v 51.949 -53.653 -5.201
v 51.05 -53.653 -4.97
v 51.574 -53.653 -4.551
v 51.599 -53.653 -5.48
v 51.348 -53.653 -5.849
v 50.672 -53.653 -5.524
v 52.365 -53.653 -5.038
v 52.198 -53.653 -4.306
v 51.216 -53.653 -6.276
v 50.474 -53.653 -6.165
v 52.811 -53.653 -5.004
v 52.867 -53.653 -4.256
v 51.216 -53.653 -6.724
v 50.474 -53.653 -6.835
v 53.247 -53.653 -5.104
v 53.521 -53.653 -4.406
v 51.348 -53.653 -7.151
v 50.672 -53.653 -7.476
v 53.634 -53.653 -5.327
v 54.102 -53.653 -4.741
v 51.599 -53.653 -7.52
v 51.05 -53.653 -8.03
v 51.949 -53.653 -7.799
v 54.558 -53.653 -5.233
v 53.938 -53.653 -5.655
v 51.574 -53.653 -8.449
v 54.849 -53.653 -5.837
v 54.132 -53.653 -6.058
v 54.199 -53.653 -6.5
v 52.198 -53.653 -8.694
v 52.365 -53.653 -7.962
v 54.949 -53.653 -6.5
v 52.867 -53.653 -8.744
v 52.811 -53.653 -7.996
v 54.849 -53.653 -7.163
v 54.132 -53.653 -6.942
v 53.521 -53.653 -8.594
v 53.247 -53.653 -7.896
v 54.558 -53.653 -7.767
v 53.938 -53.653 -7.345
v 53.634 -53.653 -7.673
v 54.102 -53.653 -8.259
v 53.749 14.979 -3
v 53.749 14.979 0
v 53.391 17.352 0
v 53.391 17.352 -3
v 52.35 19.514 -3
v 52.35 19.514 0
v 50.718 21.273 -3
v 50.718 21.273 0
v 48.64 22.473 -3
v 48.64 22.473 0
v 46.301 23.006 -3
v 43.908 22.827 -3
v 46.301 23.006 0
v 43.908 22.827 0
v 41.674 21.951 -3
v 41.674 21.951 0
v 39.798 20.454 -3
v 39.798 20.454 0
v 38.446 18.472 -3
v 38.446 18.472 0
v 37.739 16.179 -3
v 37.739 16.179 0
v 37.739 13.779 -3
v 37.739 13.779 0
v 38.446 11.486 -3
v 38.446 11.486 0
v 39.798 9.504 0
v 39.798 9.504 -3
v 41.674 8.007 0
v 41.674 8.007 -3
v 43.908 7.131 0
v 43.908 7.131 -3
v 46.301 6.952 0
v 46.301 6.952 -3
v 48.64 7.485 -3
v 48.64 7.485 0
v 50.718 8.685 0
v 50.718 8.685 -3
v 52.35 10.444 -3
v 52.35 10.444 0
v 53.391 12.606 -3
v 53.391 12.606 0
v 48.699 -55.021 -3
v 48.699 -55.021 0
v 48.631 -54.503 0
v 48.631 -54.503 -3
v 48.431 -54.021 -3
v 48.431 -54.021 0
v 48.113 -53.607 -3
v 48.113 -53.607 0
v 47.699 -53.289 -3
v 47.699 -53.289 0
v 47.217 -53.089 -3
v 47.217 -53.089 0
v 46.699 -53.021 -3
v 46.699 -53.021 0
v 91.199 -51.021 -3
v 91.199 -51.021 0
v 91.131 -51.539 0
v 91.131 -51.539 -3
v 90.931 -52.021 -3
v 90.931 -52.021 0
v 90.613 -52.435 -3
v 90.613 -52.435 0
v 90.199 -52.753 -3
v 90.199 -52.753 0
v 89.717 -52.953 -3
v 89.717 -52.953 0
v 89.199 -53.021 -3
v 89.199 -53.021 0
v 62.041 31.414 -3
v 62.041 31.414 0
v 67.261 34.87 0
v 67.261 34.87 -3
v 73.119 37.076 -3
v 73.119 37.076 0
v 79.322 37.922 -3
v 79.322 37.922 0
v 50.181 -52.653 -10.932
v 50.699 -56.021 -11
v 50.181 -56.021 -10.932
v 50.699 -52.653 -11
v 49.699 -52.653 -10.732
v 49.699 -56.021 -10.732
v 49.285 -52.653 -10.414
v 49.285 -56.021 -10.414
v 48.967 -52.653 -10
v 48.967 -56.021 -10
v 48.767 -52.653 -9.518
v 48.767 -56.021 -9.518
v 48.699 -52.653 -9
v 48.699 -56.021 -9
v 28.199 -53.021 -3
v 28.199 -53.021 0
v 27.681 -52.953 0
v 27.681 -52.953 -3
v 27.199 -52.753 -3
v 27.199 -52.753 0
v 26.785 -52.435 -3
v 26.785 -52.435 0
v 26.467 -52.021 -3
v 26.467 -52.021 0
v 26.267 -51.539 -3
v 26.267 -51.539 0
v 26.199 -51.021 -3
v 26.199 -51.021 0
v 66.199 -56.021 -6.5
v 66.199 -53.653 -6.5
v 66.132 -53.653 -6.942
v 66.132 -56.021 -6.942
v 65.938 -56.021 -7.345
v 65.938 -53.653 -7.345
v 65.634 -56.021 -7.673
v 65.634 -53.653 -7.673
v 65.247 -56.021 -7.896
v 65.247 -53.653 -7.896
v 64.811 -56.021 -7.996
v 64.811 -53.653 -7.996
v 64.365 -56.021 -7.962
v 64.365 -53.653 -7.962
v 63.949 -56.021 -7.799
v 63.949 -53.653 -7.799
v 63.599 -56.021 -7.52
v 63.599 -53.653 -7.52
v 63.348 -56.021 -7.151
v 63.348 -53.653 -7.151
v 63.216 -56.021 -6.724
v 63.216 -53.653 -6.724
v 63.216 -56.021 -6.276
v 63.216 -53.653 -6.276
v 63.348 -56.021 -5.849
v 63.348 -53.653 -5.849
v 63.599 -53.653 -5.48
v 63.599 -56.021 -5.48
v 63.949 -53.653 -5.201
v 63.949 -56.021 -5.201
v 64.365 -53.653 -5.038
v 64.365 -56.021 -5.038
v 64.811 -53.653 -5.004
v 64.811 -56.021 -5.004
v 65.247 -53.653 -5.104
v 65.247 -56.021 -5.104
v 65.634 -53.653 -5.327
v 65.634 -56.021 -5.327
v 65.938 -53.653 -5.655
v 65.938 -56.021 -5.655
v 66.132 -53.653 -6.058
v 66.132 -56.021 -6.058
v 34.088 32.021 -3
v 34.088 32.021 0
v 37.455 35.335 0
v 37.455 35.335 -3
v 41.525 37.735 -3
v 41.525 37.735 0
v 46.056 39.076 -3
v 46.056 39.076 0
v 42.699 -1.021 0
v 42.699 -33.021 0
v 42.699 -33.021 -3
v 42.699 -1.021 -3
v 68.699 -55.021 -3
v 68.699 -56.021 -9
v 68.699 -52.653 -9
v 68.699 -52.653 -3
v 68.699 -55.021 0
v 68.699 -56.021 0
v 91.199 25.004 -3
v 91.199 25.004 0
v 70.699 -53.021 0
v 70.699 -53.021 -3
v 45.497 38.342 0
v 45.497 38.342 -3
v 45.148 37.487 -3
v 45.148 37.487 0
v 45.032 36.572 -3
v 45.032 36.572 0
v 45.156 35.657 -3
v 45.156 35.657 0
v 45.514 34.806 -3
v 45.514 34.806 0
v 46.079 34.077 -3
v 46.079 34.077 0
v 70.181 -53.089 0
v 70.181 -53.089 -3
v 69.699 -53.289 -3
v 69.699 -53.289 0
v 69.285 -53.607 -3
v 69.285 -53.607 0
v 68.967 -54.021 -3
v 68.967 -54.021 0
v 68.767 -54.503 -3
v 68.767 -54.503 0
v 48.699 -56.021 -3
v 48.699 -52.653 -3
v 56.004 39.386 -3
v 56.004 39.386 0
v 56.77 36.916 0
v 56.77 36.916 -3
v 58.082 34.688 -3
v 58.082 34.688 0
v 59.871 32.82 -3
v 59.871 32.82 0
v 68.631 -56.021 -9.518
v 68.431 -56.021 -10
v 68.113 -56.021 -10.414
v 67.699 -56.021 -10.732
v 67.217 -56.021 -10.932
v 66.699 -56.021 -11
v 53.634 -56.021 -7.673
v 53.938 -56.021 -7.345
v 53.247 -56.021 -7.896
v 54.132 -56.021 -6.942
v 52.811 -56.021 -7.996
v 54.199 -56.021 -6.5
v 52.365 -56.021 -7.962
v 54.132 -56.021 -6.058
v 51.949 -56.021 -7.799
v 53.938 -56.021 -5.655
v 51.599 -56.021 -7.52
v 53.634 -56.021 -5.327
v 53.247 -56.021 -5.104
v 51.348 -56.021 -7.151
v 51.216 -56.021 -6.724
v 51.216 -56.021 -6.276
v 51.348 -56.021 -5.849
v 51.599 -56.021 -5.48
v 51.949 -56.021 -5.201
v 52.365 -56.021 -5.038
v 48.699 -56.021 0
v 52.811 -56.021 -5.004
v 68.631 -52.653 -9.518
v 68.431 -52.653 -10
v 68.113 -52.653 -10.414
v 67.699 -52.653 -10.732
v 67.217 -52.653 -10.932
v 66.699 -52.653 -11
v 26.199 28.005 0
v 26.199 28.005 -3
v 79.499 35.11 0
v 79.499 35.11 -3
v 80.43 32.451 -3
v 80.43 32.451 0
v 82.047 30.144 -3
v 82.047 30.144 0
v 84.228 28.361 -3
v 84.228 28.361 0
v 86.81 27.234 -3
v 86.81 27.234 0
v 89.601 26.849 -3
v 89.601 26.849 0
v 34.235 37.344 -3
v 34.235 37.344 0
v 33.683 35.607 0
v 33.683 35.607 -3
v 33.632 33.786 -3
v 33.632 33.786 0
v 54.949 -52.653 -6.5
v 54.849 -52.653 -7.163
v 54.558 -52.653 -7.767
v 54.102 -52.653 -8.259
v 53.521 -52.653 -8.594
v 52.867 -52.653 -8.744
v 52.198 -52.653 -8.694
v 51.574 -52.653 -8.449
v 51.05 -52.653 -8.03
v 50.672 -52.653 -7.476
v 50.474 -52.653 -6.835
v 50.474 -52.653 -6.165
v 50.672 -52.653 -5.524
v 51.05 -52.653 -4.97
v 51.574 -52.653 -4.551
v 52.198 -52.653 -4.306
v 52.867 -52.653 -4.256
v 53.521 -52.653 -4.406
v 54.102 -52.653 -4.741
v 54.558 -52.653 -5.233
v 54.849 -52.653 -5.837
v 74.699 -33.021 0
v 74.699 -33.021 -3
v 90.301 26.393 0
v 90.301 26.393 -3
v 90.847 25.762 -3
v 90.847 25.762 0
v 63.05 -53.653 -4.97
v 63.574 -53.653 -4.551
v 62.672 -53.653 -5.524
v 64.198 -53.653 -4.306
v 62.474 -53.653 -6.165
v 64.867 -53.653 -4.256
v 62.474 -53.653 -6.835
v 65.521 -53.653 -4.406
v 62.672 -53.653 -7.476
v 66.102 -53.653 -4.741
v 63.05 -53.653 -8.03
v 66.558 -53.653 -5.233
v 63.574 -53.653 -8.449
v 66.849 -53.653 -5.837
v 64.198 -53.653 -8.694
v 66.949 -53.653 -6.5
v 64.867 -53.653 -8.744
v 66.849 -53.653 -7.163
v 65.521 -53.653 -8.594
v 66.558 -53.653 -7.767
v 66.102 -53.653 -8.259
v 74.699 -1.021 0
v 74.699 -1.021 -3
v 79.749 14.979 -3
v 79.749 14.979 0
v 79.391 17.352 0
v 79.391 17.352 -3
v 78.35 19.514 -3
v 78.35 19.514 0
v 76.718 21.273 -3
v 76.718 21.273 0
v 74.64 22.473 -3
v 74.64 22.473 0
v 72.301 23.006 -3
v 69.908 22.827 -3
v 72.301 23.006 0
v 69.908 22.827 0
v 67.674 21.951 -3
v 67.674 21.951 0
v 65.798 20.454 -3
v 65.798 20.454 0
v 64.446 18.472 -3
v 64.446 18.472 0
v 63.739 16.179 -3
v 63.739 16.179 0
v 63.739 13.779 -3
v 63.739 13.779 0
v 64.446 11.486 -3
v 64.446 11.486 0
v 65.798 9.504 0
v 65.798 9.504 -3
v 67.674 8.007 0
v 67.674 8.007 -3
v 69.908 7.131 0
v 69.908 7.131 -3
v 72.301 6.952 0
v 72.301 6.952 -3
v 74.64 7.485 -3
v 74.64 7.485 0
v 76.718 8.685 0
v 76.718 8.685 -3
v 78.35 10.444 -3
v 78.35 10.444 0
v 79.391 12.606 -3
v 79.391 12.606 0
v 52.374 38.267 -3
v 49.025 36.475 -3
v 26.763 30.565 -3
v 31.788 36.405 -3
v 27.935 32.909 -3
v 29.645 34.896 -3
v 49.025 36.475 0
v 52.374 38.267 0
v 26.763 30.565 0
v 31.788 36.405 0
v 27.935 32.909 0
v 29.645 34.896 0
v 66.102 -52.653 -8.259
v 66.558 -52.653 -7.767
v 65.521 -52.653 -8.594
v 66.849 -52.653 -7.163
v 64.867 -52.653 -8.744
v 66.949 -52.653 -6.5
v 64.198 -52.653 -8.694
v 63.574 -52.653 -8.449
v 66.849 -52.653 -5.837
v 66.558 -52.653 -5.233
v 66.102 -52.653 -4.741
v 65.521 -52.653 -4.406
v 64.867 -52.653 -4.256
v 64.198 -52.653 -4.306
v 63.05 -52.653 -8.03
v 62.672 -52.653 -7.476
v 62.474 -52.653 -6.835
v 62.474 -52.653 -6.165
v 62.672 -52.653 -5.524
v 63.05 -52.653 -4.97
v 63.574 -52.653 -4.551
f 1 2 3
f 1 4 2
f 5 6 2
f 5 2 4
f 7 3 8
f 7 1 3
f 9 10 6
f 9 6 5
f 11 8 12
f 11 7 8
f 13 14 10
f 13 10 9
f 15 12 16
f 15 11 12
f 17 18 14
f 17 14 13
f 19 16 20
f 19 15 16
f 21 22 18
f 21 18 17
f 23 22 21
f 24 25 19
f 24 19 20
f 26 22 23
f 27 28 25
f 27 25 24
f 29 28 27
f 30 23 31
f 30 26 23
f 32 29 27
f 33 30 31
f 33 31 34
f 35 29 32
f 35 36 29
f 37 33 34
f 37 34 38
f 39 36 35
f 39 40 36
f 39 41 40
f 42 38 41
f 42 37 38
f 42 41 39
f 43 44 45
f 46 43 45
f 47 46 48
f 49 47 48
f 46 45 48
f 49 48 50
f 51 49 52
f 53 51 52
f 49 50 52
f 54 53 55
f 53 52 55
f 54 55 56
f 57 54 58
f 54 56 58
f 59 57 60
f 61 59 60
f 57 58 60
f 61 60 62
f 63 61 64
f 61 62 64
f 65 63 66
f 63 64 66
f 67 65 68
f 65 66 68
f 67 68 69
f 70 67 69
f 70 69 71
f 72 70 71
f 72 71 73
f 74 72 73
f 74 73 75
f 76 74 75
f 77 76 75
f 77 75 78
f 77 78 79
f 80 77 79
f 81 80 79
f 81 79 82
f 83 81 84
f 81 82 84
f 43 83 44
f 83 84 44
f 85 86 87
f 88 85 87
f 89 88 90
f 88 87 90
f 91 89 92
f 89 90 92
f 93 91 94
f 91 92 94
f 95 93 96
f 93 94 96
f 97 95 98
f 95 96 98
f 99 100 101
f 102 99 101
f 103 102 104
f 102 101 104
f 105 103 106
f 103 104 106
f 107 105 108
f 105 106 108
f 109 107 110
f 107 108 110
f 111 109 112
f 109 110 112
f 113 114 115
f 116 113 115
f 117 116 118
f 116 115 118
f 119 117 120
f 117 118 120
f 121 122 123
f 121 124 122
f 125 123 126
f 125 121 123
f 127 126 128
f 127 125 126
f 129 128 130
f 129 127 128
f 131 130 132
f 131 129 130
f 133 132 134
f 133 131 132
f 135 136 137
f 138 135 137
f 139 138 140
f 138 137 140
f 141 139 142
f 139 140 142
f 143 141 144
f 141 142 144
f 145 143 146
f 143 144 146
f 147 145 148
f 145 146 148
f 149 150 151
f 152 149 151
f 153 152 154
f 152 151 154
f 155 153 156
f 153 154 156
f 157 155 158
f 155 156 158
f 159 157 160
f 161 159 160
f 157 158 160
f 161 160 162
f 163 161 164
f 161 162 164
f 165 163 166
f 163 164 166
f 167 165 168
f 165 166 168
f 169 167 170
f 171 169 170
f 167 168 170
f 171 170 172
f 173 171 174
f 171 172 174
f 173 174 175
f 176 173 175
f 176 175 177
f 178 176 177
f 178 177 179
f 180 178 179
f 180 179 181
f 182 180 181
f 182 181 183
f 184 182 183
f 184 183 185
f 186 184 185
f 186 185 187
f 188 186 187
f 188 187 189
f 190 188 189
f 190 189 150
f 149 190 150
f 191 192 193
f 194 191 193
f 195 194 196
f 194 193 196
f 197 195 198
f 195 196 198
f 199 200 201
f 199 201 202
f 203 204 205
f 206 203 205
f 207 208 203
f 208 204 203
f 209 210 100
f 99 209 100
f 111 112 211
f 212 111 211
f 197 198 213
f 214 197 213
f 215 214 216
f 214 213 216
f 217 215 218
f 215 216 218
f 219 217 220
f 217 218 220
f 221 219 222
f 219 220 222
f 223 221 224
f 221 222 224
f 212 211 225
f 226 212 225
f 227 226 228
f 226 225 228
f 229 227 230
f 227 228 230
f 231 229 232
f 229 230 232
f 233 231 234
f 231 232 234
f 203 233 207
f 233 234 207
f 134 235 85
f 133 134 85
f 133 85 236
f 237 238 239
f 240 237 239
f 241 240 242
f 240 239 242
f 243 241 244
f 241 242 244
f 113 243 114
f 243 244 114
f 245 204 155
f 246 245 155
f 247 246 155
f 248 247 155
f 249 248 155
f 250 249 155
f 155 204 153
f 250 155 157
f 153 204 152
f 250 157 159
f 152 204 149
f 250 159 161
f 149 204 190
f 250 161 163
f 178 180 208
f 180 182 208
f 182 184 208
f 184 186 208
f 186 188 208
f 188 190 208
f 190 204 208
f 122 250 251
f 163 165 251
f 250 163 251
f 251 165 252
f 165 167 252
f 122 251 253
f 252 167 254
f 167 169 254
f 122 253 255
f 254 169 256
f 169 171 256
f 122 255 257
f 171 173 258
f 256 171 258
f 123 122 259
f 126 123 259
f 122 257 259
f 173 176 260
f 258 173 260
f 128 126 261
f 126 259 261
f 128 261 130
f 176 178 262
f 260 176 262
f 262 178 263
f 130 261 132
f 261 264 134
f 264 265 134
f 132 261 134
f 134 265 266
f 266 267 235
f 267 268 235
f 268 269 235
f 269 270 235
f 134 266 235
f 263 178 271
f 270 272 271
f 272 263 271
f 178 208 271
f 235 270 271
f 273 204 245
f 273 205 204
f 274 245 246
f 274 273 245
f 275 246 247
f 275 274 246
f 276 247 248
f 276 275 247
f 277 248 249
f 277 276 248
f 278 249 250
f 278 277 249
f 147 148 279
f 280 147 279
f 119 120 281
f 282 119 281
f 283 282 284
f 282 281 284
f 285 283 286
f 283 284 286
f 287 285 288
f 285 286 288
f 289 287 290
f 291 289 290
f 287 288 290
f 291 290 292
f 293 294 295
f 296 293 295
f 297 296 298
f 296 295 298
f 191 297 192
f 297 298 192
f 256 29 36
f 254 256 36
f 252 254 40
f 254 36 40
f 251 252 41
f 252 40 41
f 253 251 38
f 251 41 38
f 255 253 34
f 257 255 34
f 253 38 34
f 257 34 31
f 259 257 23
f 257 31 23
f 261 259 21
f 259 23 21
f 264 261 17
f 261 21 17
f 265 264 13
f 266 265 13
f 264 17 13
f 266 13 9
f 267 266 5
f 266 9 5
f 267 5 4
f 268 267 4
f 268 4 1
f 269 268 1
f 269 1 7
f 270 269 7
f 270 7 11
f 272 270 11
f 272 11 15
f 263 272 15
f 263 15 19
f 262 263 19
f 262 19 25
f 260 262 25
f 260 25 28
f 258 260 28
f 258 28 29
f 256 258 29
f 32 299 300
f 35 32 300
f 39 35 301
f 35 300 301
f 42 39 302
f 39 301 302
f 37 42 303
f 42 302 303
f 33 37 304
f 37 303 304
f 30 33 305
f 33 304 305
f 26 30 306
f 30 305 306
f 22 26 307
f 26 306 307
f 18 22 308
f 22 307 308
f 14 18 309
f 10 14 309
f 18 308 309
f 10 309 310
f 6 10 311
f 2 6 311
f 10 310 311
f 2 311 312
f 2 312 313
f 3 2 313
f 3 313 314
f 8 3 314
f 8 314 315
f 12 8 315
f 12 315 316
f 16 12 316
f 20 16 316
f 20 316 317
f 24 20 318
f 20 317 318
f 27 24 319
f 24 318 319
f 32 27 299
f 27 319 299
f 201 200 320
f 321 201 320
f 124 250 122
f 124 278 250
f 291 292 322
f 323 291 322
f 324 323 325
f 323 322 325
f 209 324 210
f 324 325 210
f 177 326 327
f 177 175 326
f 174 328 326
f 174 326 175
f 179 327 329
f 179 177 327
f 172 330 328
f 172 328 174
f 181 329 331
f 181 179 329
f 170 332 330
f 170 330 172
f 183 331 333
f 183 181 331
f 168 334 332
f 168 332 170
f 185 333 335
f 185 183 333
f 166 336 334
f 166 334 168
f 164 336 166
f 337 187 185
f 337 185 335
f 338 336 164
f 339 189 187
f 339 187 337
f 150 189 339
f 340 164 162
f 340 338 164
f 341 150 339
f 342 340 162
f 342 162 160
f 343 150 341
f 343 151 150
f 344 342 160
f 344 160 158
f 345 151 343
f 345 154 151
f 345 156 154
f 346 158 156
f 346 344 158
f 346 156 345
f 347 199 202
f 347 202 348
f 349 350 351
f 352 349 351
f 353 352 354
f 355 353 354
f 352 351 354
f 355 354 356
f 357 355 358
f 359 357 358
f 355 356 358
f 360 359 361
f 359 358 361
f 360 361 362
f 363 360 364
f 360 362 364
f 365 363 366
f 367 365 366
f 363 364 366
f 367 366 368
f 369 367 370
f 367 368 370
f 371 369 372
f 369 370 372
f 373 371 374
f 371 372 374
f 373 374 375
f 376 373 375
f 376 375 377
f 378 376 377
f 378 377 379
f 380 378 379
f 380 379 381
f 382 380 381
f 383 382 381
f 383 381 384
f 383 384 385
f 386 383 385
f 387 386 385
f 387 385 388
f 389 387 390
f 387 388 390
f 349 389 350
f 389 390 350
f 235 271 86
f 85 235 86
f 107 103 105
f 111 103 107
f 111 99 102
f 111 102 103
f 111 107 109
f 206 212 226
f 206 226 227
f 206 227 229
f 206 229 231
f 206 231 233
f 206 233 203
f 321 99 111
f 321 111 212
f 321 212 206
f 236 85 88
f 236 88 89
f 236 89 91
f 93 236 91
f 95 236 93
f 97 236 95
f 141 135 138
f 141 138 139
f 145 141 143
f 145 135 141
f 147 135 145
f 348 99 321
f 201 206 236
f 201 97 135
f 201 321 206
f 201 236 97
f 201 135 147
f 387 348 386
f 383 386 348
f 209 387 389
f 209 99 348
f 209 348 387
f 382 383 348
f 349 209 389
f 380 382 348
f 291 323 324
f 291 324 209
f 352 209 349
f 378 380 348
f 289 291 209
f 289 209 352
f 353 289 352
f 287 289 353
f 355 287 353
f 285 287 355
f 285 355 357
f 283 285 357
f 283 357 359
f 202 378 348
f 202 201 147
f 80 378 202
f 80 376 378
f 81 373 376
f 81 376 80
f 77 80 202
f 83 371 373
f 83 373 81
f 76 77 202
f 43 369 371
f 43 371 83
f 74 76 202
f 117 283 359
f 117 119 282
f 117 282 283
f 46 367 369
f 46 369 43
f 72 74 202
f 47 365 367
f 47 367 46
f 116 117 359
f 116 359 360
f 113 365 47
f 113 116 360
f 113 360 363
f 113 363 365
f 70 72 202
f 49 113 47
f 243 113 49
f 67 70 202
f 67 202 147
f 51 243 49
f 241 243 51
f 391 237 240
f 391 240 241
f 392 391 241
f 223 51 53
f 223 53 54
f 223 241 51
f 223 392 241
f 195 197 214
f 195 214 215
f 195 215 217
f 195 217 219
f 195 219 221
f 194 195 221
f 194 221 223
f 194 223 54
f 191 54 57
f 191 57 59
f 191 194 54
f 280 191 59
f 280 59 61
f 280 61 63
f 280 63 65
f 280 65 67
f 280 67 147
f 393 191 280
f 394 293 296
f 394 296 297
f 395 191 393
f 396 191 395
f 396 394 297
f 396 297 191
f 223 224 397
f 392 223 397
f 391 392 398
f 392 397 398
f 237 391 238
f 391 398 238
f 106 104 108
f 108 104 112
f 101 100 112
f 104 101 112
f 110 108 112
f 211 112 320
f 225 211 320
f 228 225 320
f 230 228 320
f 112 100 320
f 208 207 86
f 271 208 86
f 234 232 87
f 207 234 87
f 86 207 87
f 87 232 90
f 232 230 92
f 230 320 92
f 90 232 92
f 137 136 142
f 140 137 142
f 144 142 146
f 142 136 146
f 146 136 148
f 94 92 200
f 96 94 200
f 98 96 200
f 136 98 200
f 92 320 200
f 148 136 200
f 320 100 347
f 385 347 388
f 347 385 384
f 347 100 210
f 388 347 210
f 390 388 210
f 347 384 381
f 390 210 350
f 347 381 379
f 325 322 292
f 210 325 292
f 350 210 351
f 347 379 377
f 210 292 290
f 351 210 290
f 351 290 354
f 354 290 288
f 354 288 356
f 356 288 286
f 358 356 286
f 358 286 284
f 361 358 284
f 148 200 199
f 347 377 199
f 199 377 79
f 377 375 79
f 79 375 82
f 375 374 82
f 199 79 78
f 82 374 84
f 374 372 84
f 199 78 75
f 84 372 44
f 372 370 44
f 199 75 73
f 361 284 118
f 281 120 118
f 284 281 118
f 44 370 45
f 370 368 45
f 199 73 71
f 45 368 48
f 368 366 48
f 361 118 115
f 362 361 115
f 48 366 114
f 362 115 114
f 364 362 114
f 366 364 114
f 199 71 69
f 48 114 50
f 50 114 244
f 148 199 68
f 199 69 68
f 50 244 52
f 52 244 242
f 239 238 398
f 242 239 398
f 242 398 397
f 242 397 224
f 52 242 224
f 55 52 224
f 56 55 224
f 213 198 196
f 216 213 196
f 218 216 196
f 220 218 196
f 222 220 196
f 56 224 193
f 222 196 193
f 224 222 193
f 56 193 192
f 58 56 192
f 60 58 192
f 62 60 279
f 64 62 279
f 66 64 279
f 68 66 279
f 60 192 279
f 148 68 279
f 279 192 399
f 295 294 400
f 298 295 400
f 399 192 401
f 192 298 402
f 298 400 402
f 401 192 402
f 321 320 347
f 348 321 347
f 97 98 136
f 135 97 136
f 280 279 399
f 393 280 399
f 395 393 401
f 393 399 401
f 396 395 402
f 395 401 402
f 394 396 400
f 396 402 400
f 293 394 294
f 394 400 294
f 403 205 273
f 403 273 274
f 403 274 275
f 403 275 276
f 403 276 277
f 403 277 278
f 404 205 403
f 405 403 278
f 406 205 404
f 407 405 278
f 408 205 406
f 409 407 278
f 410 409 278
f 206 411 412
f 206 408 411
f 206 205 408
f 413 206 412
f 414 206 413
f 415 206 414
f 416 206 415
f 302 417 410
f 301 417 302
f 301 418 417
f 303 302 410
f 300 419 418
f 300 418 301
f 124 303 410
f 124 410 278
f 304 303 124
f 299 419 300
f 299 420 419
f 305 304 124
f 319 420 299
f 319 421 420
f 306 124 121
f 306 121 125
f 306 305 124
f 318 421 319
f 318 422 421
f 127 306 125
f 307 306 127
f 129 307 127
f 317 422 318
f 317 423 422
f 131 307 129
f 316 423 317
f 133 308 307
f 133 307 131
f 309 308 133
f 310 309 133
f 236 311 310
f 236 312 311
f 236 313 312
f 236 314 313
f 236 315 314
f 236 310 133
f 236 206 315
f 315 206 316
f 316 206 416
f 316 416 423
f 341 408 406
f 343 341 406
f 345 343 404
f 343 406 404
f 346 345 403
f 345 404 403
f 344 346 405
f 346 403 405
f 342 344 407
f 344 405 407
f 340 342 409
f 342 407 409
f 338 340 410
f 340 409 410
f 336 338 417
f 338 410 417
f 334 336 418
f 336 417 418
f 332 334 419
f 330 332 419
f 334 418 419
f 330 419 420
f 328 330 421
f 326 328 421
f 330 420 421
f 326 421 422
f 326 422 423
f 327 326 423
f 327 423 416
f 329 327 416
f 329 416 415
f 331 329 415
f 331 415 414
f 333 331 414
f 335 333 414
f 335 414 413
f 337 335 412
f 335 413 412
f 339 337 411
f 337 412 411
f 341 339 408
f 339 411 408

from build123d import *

# Parameters (mm, degrees)
MODEL_R                 = 8.05
MODEL_W                 = 32
MODEL_H                 = 32
SALIENTE_EXTRUIR1_DEPTH = 3
CROQUIS2_W              = 20
CROQUIS2_H              = 3.368375984
SALIENTE_EXTRUIR2_DEPTH = 8
CROQUIS3_R              = 1.5
CORTAR_EXTRUIR1_DEPTH   = 4
REDONDEO1_R             = 2
CROQUIS4_R              = 2.25
CORTAR_EXTRUIR2_DEPTH   = 1


with BuildPart() as part:
    # Model → Saliente-Extruir1 (new body)
    with BuildSketch(Plane.XY):
        with BuildLine():
            Line((89.198959582, -53.020997464), (70.698959583, -53.020997464))
            ThreePointArc((70.698959583, -53.020997464), (69.28474602, -53.606783901), (68.698959582, -55.020997464))
            Line((68.698959582, -55.020997464), (68.698959582, -56.020997464))
            Line((68.698959582, -56.020997464), (48.698959582, -56.020997464))
            Line((48.698959582, -56.020997464), (48.698959583, -55.020997464))
            ThreePointArc((48.698959583, -55.020997464), (48.113173145, -53.606783901), (46.698959582, -53.020997464))
            Line((46.698959582, -53.020997464), (28.198959582, -53.020997464))
            ThreePointArc((28.198959582, -53.020997464), (26.78474602, -52.435211026), (26.198959582, -51.020997464))
            Line((26.198959582, -51.020997464), (26.198959582, 28.005161342))
            ThreePointArc((26.198959582, 28.005161342), (28.72866076, 33.955350752), (34.23516159, 37.343947904))
            ThreePointArc((34.23516159, 37.343947904), (33.593436695, 34.698271666), (34.088137303, 32.021205191))
            ThreePointArc((34.088137303, 32.021205191), (39.416934224, 36.659890309), (46.05573433, 39.07646007))
            ThreePointArc((46.05573433, 39.07646007), (45.031738366, 36.571712032), (46.078788199, 34.076513218))
            ThreePointArc((46.078788199, 34.076513218), (50.656295588, 37.451644327), (56.004342405, 39.386451589))
            ThreePointArc((56.004342405, 39.386451589), (58.081757107, 34.687776201), (62.041164818, 31.41420127))
            ThreePointArc((62.041164818, 31.41420127), (70.12810034, 36.137425043), (79.321724733, 37.92198087))
            ThreePointArc((79.321724733, 37.92198087), (82.046795326, 30.144055291), (89.601066614, 26.849344169))
            ThreePointArc((89.601066614, 26.849344169), (90.596172101, 26.096573111), (91.198959583, 25.004077597))
            Line((91.198959583, 25.004077597), (91.198959583, -51.020997464))
            ThreePointArc((91.198959583, -51.020997464), (90.613173145, -52.435211026), (89.198959582, -53.020997464))
        make_face()
        with Locations((71.698959582, 14.979002536)):
            Circle(MODEL_R, mode=Mode.SUBTRACT)
        with Locations((45.698959583, 14.979002536)):
            Circle(MODEL_R, mode=Mode.SUBTRACT)
        with Locations((58.698959582, -17.020997464)):
            Rectangle(MODEL_W, MODEL_H, mode=Mode.SUBTRACT)
    extrude(amount=-SALIENTE_EXTRUIR1_DEPTH)

    # Croquis2 → Saliente-Extruir2 (add)
    with BuildSketch(Plane(origin=(0, 0, -3), x_dir=(-1, 0, 0), z_dir=(0, 0, -1))):
        with Locations((-58.698959582, -54.336809472)):
            Rectangle(CROQUIS2_W, CROQUIS2_H)
    extrude(amount=SALIENTE_EXTRUIR2_DEPTH)

    # Croquis3 → Cortar-Extruir1 (cut)
    with BuildSketch(Plane(origin=(0, -52.65262148, 0), x_dir=(1, 0, 0), z_dir=(0, 1, 0))):
        with Locations((64.698959582, 6.5)):
            Circle(CROQUIS3_R)
        with Locations((52.698959582, 6.5)):
            Circle(CROQUIS3_R)
    extrude(amount=-CORTAR_EXTRUIR1_DEPTH, mode=Mode.SUBTRACT)

    # Redondeo1
    redondeo1_edges = [part.edges().sort_by_distance(p)[0] for p in [
        (48.698959582, -54.336809472, -11),
        (68.698959582, -54.336809472, -11),
    ]]
    fillet(redondeo1_edges, radius=REDONDEO1_R)

    # Croquis4 → Cortar-Extruir2 (cut)
    with BuildSketch(Plane(origin=(0, -52.65262148, 0), x_dir=(1, 0, 0), z_dir=(0, 1, 0))):
        with Locations((52.698959582, 6.5)):
            Circle(CROQUIS4_R)
        with Locations((64.698959582, 6.5)):
            Circle(CROQUIS4_R)
    extrude(amount=-CORTAR_EXTRUIR2_DEPTH, mode=Mode.SUBTRACT)


solid = part.part
